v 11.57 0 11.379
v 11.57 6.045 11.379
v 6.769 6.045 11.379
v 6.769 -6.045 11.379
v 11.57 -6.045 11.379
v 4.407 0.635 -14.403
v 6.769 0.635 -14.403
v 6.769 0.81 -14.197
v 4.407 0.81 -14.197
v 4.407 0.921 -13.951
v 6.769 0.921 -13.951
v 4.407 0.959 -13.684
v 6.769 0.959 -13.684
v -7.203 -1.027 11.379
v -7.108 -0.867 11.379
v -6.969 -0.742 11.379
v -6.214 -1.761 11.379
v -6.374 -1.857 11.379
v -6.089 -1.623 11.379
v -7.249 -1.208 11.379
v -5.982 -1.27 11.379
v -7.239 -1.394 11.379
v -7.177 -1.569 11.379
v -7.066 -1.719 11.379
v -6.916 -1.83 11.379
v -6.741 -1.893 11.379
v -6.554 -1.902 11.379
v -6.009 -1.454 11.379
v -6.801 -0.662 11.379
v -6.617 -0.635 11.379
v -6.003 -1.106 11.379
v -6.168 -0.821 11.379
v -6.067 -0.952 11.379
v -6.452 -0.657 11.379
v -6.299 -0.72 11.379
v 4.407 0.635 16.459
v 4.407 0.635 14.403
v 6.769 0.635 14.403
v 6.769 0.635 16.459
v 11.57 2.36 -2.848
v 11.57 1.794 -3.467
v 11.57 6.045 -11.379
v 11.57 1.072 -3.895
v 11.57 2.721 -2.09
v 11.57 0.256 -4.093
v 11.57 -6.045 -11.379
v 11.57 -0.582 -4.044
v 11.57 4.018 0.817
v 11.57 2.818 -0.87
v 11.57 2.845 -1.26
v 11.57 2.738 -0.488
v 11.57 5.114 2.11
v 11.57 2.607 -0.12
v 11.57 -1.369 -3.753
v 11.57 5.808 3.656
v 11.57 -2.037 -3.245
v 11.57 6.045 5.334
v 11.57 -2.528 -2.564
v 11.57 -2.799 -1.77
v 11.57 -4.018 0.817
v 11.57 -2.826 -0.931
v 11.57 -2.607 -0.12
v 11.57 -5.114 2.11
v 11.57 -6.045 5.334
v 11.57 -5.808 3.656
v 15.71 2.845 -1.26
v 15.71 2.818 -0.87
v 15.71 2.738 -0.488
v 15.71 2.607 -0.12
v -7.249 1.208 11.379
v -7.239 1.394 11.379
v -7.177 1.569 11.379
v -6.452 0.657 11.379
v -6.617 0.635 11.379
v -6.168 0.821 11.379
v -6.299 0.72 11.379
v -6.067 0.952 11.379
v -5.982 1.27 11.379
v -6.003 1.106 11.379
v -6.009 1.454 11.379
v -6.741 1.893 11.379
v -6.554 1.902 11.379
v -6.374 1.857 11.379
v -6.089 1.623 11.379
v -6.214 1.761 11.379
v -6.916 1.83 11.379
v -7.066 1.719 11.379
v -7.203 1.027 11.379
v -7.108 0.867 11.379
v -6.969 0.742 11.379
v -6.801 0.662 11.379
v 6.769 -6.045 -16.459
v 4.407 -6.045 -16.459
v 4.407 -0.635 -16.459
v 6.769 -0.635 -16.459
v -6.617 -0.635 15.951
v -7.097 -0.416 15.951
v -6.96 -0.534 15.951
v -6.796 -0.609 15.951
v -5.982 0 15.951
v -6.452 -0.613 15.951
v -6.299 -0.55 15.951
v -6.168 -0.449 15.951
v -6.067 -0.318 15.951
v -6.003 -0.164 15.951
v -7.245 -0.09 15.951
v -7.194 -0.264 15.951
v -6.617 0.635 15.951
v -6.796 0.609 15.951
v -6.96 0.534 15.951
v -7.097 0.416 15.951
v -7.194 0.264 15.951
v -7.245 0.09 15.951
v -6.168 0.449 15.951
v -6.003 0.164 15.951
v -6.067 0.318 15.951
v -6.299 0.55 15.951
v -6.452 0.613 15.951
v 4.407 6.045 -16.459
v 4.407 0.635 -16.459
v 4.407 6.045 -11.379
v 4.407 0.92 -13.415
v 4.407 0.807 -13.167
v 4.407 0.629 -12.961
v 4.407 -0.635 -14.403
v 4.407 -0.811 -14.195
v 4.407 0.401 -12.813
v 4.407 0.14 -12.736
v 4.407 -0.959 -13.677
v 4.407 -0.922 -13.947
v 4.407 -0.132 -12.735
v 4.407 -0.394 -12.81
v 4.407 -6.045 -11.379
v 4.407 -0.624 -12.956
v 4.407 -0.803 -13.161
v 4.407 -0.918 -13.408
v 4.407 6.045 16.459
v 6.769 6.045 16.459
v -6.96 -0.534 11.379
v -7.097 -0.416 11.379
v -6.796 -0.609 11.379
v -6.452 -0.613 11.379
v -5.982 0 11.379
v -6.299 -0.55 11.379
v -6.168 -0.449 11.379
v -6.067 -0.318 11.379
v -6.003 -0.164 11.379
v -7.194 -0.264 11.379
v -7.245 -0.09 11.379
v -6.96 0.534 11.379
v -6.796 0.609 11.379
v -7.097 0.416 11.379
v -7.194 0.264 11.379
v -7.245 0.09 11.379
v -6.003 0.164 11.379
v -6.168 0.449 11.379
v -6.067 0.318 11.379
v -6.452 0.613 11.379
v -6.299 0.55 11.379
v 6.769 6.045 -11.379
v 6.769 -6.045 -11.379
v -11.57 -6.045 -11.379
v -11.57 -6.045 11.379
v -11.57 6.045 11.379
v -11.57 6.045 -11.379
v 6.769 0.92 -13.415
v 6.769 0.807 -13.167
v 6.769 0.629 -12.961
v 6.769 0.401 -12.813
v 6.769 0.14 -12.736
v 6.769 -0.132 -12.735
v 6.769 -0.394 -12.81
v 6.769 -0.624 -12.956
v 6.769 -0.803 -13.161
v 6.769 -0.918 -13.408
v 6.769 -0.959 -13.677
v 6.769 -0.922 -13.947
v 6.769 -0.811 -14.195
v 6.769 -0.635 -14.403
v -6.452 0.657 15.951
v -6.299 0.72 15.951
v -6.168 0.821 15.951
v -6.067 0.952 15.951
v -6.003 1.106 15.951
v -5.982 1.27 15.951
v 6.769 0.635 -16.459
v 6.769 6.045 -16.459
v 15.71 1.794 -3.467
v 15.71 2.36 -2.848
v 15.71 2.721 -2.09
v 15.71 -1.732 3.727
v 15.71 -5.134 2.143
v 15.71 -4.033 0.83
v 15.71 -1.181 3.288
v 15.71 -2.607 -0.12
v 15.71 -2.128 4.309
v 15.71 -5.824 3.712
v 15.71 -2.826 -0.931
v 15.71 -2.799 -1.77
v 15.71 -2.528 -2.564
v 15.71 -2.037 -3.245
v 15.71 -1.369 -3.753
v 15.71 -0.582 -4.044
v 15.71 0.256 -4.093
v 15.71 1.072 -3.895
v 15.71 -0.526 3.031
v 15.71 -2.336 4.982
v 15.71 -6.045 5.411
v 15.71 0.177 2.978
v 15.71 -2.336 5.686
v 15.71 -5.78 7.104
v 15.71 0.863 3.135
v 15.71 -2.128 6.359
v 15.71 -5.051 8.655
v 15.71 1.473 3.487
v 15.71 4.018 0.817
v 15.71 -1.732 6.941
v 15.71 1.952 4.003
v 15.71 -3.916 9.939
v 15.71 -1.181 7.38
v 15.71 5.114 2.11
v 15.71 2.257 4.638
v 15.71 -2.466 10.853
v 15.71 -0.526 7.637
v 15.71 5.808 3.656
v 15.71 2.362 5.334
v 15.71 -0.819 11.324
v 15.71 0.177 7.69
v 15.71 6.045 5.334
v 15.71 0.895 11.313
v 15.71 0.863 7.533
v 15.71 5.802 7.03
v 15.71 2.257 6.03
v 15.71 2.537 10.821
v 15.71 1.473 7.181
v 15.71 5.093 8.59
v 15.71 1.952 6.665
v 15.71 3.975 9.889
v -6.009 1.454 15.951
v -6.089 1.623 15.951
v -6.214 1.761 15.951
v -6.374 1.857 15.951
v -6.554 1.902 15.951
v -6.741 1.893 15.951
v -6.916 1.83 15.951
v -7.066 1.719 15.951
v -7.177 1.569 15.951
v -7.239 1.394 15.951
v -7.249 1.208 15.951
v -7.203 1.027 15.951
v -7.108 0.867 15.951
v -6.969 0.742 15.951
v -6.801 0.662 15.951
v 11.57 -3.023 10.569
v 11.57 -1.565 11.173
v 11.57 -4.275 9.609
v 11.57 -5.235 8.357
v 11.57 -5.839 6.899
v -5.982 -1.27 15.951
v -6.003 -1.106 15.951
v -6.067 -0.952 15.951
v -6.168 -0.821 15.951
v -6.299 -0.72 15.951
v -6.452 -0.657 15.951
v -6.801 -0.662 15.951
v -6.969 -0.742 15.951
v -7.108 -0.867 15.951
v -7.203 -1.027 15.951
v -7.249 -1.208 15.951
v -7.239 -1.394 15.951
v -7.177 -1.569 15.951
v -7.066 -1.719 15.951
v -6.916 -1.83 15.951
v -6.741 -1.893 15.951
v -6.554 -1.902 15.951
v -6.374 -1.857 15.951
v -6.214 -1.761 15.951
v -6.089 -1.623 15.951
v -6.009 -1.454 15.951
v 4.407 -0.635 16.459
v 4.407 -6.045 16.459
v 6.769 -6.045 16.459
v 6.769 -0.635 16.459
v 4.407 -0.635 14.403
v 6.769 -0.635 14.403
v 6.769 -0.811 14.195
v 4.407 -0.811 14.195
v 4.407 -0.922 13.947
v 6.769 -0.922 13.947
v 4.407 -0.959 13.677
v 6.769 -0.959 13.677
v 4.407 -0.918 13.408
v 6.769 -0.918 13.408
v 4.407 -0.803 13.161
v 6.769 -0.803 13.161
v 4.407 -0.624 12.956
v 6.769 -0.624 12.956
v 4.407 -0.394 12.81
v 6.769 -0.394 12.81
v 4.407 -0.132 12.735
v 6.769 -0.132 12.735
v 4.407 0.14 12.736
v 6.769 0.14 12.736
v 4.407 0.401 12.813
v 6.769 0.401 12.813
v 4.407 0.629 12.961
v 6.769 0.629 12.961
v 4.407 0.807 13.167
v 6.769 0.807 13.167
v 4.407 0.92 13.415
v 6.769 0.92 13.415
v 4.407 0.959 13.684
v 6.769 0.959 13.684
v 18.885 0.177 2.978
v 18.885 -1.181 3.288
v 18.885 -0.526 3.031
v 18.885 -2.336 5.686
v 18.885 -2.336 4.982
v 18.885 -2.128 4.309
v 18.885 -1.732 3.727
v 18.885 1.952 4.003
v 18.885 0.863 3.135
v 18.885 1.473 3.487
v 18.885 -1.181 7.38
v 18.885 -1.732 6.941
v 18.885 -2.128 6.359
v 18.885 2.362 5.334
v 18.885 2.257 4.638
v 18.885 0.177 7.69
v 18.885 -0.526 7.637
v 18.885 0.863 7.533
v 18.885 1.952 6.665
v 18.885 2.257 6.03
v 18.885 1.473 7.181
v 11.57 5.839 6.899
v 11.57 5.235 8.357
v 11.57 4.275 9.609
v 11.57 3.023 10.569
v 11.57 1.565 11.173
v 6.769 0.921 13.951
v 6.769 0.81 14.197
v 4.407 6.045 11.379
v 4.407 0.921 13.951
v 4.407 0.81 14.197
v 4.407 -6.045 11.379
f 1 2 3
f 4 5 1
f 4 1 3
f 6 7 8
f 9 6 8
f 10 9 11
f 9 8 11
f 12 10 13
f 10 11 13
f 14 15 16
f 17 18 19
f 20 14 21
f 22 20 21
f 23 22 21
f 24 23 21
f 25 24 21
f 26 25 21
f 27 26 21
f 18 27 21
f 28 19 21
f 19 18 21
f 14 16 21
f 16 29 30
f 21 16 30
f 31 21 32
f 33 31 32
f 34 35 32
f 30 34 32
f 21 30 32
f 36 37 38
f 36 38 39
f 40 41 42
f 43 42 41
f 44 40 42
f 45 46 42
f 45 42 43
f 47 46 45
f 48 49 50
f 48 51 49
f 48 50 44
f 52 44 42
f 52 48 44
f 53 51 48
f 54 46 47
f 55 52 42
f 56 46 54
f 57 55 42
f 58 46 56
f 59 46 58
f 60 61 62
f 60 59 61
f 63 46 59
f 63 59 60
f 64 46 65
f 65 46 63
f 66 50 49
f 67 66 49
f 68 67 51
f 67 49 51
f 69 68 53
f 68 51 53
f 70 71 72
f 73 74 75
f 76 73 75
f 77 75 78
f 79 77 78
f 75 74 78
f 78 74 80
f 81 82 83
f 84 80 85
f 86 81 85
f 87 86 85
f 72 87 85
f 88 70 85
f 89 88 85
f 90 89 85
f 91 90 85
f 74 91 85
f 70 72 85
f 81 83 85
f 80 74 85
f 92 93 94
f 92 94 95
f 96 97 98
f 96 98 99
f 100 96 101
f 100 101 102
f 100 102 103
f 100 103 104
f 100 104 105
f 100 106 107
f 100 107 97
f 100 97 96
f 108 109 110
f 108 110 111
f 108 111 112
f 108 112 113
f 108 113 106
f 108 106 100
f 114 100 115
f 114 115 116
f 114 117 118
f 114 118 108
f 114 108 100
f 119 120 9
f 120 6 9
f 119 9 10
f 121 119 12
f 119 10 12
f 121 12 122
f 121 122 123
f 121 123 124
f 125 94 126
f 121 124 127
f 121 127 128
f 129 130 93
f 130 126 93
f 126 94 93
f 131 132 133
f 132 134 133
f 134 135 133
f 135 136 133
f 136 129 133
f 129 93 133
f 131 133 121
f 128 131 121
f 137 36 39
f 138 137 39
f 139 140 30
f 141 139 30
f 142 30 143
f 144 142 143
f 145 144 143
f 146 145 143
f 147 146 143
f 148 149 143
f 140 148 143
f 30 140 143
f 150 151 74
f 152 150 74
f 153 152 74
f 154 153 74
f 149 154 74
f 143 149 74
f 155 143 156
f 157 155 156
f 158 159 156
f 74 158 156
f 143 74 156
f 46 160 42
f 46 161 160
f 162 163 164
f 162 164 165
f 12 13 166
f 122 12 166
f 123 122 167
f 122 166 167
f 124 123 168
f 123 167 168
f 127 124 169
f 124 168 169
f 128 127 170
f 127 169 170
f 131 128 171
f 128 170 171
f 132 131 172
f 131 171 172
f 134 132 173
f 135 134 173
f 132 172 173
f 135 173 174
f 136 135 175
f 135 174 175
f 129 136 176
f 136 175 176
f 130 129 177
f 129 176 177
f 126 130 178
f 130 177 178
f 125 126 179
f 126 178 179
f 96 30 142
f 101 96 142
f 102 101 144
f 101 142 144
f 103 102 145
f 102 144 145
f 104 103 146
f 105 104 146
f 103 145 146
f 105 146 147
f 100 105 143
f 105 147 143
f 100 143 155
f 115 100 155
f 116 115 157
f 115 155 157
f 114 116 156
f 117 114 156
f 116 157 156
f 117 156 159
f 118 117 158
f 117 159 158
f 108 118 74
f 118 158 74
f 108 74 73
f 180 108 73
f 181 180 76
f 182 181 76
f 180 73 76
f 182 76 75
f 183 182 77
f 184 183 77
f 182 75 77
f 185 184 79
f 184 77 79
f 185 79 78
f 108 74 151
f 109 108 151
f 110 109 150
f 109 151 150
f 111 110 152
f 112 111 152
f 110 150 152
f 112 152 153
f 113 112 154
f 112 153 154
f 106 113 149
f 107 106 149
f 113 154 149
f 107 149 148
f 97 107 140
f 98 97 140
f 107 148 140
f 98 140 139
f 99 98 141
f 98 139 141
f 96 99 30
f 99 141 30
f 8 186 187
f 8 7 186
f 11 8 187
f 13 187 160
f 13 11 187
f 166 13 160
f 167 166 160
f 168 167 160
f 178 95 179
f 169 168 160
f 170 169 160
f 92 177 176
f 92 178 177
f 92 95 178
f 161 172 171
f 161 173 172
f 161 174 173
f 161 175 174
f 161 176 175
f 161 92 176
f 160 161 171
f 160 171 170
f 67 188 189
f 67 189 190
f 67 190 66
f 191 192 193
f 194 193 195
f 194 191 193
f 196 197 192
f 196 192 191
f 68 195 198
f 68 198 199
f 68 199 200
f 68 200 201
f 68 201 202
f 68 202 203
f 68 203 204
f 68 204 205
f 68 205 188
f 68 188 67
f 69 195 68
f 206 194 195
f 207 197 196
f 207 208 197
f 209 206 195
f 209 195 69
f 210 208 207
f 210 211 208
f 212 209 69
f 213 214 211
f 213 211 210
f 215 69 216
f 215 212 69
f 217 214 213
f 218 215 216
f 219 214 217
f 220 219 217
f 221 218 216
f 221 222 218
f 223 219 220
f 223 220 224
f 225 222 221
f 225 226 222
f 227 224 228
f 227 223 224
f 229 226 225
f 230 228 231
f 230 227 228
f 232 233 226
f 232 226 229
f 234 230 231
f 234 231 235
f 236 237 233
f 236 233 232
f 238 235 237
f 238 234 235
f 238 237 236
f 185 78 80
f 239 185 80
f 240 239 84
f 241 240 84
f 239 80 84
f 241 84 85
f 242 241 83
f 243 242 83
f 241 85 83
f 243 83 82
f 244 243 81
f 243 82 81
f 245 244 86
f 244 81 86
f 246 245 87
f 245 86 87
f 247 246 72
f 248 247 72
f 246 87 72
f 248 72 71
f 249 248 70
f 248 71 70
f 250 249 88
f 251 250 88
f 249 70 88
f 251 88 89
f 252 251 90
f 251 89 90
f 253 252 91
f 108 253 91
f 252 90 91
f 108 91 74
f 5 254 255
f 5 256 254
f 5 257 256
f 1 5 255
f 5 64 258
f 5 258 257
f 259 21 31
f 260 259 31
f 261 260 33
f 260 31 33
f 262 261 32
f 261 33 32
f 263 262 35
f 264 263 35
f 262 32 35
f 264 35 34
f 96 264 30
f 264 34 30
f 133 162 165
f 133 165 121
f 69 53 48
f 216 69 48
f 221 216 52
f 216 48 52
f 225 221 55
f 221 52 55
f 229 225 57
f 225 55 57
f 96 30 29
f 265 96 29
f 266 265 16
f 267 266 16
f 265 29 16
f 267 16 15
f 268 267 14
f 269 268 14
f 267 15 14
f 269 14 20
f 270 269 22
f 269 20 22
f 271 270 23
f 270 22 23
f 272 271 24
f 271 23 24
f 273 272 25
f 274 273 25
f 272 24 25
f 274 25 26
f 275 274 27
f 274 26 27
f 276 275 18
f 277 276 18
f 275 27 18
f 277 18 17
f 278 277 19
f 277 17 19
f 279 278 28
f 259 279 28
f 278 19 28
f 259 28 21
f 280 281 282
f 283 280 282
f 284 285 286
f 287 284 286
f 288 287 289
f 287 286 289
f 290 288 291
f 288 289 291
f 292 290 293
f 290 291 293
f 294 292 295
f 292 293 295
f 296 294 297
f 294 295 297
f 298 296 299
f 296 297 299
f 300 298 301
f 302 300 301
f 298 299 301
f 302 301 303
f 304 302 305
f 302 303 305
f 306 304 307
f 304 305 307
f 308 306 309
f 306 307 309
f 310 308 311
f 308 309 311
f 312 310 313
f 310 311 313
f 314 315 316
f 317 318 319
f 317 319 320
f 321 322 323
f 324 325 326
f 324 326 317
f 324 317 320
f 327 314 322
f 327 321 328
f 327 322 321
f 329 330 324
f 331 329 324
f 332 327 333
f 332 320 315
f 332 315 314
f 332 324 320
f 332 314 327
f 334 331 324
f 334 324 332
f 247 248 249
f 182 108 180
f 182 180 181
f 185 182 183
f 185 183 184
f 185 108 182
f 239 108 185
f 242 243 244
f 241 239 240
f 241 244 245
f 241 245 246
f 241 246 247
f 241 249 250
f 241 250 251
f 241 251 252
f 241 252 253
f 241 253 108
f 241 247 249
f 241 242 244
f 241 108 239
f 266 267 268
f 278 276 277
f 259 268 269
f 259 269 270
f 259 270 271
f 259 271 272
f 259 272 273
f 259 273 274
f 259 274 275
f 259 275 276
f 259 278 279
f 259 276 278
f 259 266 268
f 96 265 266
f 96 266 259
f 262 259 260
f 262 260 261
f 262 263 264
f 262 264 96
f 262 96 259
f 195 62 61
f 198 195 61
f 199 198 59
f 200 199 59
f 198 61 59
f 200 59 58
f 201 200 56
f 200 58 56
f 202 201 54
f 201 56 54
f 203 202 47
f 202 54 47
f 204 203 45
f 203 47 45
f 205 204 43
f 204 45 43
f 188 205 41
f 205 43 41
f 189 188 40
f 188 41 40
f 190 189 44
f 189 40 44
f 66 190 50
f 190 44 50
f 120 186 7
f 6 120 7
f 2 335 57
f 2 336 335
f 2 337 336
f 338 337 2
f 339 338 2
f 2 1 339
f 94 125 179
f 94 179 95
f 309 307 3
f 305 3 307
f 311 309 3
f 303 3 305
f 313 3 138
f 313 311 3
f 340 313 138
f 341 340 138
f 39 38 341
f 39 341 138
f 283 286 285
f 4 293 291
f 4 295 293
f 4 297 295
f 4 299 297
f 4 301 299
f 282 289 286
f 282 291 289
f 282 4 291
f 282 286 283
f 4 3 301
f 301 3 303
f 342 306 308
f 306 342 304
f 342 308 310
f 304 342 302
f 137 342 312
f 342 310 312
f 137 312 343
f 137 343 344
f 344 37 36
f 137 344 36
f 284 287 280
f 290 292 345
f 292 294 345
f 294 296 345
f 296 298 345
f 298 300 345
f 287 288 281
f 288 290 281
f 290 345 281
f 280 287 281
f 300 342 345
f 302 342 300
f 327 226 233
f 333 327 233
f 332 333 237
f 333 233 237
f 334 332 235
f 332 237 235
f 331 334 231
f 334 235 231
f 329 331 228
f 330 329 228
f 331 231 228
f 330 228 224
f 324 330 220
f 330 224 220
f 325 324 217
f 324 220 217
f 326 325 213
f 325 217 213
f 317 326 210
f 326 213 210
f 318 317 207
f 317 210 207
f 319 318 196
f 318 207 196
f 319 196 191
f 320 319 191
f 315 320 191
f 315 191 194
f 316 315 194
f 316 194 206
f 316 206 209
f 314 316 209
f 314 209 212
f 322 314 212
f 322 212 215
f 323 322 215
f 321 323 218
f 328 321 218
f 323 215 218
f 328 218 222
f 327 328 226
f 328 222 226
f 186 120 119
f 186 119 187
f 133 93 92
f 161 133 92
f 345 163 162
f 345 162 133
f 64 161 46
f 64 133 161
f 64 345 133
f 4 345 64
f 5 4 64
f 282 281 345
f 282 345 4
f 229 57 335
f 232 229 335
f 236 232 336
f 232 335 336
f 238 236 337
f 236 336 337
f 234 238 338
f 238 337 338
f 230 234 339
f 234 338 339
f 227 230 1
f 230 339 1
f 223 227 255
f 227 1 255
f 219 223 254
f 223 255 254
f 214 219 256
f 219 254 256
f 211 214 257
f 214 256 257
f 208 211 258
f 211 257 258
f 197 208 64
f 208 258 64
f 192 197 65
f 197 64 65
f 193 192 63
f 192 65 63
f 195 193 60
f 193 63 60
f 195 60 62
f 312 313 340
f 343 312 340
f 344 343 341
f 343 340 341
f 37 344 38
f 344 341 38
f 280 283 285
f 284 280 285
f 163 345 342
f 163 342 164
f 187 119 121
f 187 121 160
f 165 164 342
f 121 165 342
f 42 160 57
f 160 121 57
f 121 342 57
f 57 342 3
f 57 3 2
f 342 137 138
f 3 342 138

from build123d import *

# Parameters (mm, degrees)
F0_W     = 2.3622
F0_H     = 5.08
F1_DEPTH = 6.0452
F3_DEPTH = 4.1402
F4_R     = 2.3622
F5_DEPTH = 3.175
F7_DEPTH = 25.4
F9_DEPTH = 4.572


with BuildPart() as f1:
    # F0 (on Front) → F1 (new body, symmetric)
    with BuildSketch(Plane.XZ):
        Polygon((6.7691, -11.3792), (11.5697, -11.3792), (11.5697, 11.3792), (6.7691, 11.3792), (4.4069, 11.3792), (-11.5697, 11.3792), (-11.5697, -11.3792), (4.4069, -11.3792), align=None)
        with Locations((5.588, -13.9192)):
            Rectangle(F0_W, F0_H)
        with Locations((5.588, 13.9192)):
            Rectangle(F0_W, F0_H)
    extrude(amount=F1_DEPTH, both=True)

    # F2 (on face) → F3 (join)
    with BuildSketch(Plane.YZ.offset(11.5697)):
        with BuildLine():
            ThreePointArc((2.6067325083, -0.1203000165), (5.1138372285, 2.1101650414), (6.0452, 5.334))
            ThreePointArc((6.0452, 5.334), (-3.2238349586, 10.4478372285), (-2.6067325083, -0.1203000165))
            ThreePointArc((-2.6067325083, -0.1203000165), (0, 1.585275392), (2.6067325083, -0.1203000165))
        make_face()
        with BuildLine():
            ThreePointArc((2.6067325083, -0.1203000165), (0, 1.585275392), (-2.6067325083, -0.1203000165))
            ThreePointArc((-2.6067325083, -0.1203000165), (0, -0.7112), (2.6067325083, -0.1203000165))
        make_face()
        with BuildLine():
            ThreePointArc((2.6067325083, -0.1203000165), (0, -0.7112), (-2.6067325083, -0.1203000165))
            ThreePointArc((-2.6067325083, -0.1203000165), (-0.5819168327, -4.0441717742), (2.8448, -1.259524608))
            ThreePointArc((2.8448, -1.259524608), (2.7846471661, -0.6776077754), (2.6067325083, -0.1203000165))
        make_face()
    extrude(amount=F3_DEPTH)

    # F4 (on face) → F5 (join)
    with BuildSketch(Plane.YZ.offset(15.7099)):
        with Locations((0, 5.334)):
            Circle(F4_R)
    extrude(amount=F5_DEPTH)

    # F6 (on face) → F7 (cut)
    with BuildSketch(Plane.YZ.offset(6.7691)):
        with BuildLine():
            Line((0.635, 14.4026985524), (0.635, 16.4592))
            Line((0.635, 16.4592), (-0.635, 16.4592))
            Line((-0.635, 16.4592), (-0.635, 14.4026985524))
            ThreePointArc((-0.635, 14.4026985524), (0, 14.6431), (0.635, 14.4026985524))
        make_face()
        with BuildLine():
            ThreePointArc((0.95885, 13.68425), (0.8741461756, 14.0782827223), (0.635, 14.4026985524))
            Line((0.635, 14.4026985524), (0.635, 13.68425))
            Line((0.635, 13.68425), (-0.635, 13.68425))
            Line((-0.635, 13.68425), (-0.635, 14.4026985524))
            ThreePointArc((-0.635, 14.4026985524), (-0.3940327223, 12.8101038244), (0.95885, 13.68425))
        make_face()
        with BuildLine():
            Line((0.635, 13.68425), (0.635, 14.4026985524))
            ThreePointArc((0.635, 14.4026985524), (0, 14.6431), (-0.635, 14.4026985524))
            Line((-0.635, 14.4026985524), (-0.635, 13.68425))
            Line((-0.635, 13.68425), (0.635, 13.68425))
        make_face()
        with BuildLine():
            Line((0.635, -14.4026985524), (0.635, -13.68425))
            Line((0.635, -13.68425), (-0.635, -13.68425))
            Line((-0.635, -13.68425), (-0.635, -14.4026985524))
            ThreePointArc((-0.635, -14.4026985524), (0, -14.6431), (0.635, -14.4026985524))
        make_face()
        with BuildLine():
            Line((-0.635, -13.68425), (0.635, -13.68425))
            Line((0.635, -13.68425), (0.635, -14.4026985524))
            ThreePointArc((0.635, -14.4026985524), (0.8741461756, -14.0782827223), (0.95885, -13.68425))
            ThreePointArc((0.95885, -13.68425), (-0.3940327223, -12.8101038244), (-0.635, -14.4026985524))
            Line((-0.635, -14.4026985524), (-0.635, -13.68425))
        make_face()
        with BuildLine():
            Line((0.635, -16.4592), (0.635, -14.4026985524))
            ThreePointArc((0.635, -14.4026985524), (0, -14.6431), (-0.635, -14.4026985524))
            Line((-0.635, -14.4026985524), (-0.635, -16.4592))
            Line((-0.635, -16.4592), (0.635, -16.4592))
        make_face()
    extrude(amount=-F7_DEPTH, mode=Mode.SUBTRACT)


with BuildPart() as f9:
    # F8 (on face) → F9 (new body)
    with BuildSketch(Plane.XY.offset(11.3792)):
        with BuildLine():
            ThreePointArc((-6.6167, -0.635), (-6.1676871939, -0.4490128061), (-5.9817, 0))
            ThreePointArc((-5.9817, 0), (-6.1676871939, 0.4490128061), (-6.6167, 0.635))
            ThreePointArc((-6.6167, 0.635), (-7.2517, 0), (-6.6167, -0.635))
        make_face()
    extrude(amount=F9_DEPTH)


with BuildPart() as f9b:
    # F8 (on face) → F9, piece 2 (new body)
    with BuildSketch(Plane.XY.offset(11.3792)):
        with BuildLine():
            ThreePointArc((-5.9817, -1.27), (-6.1676871939, -0.8209871939), (-6.6167, -0.635))
            ThreePointArc((-6.6167, -0.635), (-7.0657128061, -1.7190128061), (-5.9817, -1.27))
        make_face()
    extrude(amount=F9_DEPTH)


with BuildPart() as f9c:
    # F8 (on face) → F9, piece 3 (new body)
    with BuildSketch(Plane.XY.offset(11.3792)):
        with BuildLine():
            ThreePointArc((-5.9817, 1.27), (-7.0657128061, 1.7190128061), (-6.6167, 0.635))
            ThreePointArc((-6.6167, 0.635), (-6.1676871939, 0.8209871939), (-5.9817, 1.27))
        make_face()
    extrude(amount=F9_DEPTH)


solid = Compound([f1.part, f9.part, f9b.part, f9c.part])
